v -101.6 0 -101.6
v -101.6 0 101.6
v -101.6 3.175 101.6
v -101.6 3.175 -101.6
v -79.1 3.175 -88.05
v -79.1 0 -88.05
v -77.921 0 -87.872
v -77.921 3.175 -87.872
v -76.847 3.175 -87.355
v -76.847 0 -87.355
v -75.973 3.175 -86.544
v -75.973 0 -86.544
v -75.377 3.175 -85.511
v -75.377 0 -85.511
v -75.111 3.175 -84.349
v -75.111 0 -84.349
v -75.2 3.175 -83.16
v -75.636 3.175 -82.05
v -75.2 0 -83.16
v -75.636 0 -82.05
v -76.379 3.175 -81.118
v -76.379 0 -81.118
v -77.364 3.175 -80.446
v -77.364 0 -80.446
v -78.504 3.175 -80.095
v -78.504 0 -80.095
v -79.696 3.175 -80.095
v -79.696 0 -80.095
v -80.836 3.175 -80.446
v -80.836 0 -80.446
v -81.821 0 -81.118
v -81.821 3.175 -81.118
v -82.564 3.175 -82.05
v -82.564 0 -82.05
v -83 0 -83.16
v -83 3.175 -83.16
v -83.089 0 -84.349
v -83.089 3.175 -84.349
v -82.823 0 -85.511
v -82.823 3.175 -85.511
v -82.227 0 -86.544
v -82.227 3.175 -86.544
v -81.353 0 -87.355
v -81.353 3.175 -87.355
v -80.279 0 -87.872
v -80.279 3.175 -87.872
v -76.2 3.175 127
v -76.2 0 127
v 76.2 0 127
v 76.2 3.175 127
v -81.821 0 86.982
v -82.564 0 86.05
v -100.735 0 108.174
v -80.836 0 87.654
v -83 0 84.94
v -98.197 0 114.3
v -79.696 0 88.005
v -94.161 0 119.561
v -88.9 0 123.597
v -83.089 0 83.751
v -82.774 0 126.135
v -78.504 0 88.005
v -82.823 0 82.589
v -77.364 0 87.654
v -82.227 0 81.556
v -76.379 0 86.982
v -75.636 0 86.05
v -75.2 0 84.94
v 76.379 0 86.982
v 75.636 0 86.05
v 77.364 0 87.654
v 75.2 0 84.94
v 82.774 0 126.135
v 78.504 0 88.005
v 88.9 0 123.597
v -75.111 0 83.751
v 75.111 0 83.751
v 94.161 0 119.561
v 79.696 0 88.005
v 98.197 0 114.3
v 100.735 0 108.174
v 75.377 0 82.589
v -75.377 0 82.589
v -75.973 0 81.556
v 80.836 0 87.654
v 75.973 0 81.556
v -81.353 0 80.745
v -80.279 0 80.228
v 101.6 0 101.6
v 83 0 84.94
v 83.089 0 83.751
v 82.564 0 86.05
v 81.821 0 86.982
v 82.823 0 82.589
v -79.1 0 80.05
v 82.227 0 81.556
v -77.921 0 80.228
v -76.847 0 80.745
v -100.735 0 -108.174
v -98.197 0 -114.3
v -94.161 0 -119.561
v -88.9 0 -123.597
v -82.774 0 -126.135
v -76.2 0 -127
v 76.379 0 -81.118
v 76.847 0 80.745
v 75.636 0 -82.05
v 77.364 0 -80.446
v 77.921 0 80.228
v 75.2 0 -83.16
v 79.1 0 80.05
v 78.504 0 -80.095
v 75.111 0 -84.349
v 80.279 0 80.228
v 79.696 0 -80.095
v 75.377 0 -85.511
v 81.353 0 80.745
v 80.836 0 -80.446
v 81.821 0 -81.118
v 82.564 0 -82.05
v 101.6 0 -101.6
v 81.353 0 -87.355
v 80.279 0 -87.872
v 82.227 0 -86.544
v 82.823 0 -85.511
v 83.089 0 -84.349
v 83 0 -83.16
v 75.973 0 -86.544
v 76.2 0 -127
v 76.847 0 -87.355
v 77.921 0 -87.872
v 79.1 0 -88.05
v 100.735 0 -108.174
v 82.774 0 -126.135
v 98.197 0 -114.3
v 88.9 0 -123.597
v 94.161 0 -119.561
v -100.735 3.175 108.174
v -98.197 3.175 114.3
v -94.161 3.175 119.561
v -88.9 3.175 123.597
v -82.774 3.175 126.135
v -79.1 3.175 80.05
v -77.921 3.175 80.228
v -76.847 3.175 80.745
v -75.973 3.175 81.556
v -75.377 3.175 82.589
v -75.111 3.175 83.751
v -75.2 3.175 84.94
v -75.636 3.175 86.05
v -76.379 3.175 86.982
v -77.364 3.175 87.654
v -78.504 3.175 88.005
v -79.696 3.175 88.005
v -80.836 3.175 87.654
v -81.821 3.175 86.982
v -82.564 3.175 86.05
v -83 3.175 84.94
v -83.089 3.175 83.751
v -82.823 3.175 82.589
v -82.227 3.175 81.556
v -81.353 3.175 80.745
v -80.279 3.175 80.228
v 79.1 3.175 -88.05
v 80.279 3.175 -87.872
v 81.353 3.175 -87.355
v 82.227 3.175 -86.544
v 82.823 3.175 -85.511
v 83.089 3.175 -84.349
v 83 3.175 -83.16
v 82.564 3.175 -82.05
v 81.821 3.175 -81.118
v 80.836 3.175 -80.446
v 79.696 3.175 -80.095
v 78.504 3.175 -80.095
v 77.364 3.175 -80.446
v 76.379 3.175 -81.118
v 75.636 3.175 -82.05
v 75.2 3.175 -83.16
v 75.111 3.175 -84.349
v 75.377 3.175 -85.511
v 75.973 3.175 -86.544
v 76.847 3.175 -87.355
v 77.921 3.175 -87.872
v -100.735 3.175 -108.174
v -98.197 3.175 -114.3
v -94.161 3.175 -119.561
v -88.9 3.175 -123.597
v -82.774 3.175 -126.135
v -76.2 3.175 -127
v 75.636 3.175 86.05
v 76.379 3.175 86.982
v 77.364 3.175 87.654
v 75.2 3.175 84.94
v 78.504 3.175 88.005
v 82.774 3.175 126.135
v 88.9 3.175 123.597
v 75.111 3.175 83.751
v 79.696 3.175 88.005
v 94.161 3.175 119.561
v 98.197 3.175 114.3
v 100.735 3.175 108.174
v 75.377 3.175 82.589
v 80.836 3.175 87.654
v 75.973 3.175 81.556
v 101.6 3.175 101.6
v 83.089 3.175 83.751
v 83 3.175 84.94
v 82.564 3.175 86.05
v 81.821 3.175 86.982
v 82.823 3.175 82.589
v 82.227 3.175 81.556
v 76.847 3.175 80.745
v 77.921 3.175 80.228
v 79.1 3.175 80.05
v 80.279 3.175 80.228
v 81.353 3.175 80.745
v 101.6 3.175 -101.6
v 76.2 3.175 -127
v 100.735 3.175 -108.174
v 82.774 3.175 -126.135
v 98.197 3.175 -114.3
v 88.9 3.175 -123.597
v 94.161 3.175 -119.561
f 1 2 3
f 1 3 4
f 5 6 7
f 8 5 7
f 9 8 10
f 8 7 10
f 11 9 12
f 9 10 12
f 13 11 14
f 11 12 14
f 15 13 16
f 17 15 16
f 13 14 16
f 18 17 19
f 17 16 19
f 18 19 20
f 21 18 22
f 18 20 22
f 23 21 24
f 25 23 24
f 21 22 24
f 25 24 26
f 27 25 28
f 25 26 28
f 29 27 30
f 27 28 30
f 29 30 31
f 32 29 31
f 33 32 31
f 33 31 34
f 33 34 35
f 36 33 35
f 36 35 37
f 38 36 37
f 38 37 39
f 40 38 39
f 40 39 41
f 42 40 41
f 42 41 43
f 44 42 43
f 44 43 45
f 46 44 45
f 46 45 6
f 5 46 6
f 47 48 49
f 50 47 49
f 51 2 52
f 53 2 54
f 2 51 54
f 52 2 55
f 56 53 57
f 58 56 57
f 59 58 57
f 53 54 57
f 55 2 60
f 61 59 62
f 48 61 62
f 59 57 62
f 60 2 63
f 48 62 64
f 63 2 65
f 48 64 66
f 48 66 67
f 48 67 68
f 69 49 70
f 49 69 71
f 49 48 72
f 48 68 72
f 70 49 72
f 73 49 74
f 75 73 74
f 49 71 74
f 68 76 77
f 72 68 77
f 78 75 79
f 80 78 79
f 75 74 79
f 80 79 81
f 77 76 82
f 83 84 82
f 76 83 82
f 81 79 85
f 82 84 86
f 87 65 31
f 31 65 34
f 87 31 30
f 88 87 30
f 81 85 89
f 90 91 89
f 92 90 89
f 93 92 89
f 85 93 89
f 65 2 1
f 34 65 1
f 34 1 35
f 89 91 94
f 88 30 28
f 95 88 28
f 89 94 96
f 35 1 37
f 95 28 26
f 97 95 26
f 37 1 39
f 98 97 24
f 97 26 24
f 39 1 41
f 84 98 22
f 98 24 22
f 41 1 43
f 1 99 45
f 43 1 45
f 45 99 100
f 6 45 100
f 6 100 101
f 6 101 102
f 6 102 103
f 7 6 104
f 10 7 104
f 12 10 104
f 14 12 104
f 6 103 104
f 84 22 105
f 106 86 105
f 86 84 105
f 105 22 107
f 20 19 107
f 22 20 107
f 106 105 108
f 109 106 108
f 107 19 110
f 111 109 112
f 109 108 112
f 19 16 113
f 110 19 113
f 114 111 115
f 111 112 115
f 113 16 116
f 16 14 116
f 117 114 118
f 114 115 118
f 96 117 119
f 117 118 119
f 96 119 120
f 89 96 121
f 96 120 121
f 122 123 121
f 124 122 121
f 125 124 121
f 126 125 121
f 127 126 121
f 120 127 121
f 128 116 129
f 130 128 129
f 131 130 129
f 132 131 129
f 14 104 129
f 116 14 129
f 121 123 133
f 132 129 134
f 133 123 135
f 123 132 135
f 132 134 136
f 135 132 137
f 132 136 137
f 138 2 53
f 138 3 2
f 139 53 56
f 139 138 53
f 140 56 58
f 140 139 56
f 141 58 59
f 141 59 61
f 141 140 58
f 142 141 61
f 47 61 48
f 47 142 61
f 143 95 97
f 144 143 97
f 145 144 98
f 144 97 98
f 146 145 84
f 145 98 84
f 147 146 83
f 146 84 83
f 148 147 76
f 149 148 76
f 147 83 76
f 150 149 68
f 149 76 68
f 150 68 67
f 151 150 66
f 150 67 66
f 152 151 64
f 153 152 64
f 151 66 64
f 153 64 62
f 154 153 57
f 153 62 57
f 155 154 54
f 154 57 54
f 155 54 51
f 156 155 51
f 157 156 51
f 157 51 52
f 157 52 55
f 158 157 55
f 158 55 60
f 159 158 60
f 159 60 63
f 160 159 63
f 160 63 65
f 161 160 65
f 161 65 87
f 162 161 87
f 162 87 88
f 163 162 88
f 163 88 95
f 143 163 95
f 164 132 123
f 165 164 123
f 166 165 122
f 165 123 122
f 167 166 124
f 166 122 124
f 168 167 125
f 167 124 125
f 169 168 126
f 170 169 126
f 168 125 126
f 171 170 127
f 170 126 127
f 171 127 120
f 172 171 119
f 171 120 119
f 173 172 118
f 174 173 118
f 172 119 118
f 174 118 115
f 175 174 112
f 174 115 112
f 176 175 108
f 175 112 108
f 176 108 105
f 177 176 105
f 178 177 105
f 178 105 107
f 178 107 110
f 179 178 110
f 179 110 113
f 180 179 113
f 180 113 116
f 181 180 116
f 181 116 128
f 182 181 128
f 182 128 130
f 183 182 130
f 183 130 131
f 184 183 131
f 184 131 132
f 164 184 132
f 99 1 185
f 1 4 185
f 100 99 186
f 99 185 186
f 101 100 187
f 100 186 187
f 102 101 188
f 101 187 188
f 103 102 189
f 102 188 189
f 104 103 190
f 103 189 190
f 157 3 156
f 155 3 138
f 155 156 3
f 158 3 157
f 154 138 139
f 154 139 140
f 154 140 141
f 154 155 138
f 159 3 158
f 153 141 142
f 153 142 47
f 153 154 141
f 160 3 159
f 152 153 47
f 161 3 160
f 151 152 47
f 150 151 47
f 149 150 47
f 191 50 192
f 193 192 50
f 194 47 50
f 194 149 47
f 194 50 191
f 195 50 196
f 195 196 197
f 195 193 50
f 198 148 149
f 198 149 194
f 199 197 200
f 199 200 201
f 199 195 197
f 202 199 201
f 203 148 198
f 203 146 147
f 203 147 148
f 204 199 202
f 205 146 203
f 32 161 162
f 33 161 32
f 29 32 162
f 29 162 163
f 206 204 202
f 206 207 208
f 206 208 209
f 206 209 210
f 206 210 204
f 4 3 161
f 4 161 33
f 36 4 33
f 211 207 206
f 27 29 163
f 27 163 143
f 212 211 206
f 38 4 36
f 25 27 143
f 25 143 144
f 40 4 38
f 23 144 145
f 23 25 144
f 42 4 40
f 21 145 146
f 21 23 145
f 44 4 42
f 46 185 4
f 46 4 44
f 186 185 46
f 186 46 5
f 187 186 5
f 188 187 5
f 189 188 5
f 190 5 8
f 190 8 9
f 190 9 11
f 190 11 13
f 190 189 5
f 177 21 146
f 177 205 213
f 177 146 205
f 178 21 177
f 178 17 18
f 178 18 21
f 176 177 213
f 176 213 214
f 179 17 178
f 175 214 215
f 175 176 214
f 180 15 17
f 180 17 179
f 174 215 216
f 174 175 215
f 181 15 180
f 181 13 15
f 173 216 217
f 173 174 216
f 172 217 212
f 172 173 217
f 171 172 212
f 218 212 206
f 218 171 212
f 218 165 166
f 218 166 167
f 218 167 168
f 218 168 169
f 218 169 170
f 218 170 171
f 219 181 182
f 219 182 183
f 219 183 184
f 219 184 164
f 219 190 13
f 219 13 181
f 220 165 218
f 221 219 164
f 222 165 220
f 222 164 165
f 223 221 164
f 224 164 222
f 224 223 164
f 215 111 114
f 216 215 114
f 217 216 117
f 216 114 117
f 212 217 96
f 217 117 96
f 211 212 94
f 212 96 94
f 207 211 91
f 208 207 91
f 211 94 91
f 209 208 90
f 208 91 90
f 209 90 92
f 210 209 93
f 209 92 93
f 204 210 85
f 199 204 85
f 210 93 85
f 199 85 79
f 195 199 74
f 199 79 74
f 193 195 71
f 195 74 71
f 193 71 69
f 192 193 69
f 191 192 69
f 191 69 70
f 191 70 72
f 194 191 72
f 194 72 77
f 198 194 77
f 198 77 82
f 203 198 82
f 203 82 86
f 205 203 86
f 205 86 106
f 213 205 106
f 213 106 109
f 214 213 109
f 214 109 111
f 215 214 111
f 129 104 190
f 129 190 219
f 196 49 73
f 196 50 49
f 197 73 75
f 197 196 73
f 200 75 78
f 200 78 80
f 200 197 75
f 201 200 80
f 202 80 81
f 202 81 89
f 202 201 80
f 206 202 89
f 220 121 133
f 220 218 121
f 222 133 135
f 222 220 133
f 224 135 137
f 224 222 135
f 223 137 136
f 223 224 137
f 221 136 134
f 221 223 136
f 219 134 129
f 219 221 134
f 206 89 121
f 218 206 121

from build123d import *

# Parameters (mm, degrees)
SKETCH1_W           = 203.2
SKETCH1_H           = 254
BOSS_EXTRUDE1_DEPTH = 3.175
FILLET1_R           = 25.4
SKETCH2_R           = 4
CUT_EXTRUDE1_DEPTH  = 25.4


with BuildPart() as part:
    # Sketch1 → Boss-Extrude1 (new body)
    with BuildSketch(Plane(origin=(0, 0, 0), x_dir=(1, 0, 0), z_dir=(0, 1, 0))):
        Rectangle(SKETCH1_W, SKETCH1_H)
    extrude(amount=BOSS_EXTRUDE1_DEPTH)

    # Fillet1
    fillet1_edges = [part.edges().sort_by_distance(p)[0] for p in [
        (101.6, 1.5875, 127),
        (-101.6, 1.5875, 127),
        (-101.6, 1.5875, -127),
        (101.6, 1.5875, -127),
    ]]
    fillet(fillet1_edges, radius=FILLET1_R)

    # Sketch2 → Cut-Extrude1 (cut)
    with BuildSketch(Plane.XZ):
        with Locations(Location((-79.1, 84.050000013, 0), (0, 0, 270))):
            Circle(SKETCH2_R)
        with Locations(Location((79.1, 84.050000013, 0), (0, 0, 270))):
            Circle(SKETCH2_R)
        with Locations(Location((79.1, -84.050000013, 0), (0, 0, 270))):
            Circle(SKETCH2_R)
        with Locations(Location((-79.1, -84.050000013, 0), (0, 0, 270))):
            Circle(SKETCH2_R)
    extrude(amount=-CUT_EXTRUDE1_DEPTH, mode=Mode.SUBTRACT)


solid = part.part
